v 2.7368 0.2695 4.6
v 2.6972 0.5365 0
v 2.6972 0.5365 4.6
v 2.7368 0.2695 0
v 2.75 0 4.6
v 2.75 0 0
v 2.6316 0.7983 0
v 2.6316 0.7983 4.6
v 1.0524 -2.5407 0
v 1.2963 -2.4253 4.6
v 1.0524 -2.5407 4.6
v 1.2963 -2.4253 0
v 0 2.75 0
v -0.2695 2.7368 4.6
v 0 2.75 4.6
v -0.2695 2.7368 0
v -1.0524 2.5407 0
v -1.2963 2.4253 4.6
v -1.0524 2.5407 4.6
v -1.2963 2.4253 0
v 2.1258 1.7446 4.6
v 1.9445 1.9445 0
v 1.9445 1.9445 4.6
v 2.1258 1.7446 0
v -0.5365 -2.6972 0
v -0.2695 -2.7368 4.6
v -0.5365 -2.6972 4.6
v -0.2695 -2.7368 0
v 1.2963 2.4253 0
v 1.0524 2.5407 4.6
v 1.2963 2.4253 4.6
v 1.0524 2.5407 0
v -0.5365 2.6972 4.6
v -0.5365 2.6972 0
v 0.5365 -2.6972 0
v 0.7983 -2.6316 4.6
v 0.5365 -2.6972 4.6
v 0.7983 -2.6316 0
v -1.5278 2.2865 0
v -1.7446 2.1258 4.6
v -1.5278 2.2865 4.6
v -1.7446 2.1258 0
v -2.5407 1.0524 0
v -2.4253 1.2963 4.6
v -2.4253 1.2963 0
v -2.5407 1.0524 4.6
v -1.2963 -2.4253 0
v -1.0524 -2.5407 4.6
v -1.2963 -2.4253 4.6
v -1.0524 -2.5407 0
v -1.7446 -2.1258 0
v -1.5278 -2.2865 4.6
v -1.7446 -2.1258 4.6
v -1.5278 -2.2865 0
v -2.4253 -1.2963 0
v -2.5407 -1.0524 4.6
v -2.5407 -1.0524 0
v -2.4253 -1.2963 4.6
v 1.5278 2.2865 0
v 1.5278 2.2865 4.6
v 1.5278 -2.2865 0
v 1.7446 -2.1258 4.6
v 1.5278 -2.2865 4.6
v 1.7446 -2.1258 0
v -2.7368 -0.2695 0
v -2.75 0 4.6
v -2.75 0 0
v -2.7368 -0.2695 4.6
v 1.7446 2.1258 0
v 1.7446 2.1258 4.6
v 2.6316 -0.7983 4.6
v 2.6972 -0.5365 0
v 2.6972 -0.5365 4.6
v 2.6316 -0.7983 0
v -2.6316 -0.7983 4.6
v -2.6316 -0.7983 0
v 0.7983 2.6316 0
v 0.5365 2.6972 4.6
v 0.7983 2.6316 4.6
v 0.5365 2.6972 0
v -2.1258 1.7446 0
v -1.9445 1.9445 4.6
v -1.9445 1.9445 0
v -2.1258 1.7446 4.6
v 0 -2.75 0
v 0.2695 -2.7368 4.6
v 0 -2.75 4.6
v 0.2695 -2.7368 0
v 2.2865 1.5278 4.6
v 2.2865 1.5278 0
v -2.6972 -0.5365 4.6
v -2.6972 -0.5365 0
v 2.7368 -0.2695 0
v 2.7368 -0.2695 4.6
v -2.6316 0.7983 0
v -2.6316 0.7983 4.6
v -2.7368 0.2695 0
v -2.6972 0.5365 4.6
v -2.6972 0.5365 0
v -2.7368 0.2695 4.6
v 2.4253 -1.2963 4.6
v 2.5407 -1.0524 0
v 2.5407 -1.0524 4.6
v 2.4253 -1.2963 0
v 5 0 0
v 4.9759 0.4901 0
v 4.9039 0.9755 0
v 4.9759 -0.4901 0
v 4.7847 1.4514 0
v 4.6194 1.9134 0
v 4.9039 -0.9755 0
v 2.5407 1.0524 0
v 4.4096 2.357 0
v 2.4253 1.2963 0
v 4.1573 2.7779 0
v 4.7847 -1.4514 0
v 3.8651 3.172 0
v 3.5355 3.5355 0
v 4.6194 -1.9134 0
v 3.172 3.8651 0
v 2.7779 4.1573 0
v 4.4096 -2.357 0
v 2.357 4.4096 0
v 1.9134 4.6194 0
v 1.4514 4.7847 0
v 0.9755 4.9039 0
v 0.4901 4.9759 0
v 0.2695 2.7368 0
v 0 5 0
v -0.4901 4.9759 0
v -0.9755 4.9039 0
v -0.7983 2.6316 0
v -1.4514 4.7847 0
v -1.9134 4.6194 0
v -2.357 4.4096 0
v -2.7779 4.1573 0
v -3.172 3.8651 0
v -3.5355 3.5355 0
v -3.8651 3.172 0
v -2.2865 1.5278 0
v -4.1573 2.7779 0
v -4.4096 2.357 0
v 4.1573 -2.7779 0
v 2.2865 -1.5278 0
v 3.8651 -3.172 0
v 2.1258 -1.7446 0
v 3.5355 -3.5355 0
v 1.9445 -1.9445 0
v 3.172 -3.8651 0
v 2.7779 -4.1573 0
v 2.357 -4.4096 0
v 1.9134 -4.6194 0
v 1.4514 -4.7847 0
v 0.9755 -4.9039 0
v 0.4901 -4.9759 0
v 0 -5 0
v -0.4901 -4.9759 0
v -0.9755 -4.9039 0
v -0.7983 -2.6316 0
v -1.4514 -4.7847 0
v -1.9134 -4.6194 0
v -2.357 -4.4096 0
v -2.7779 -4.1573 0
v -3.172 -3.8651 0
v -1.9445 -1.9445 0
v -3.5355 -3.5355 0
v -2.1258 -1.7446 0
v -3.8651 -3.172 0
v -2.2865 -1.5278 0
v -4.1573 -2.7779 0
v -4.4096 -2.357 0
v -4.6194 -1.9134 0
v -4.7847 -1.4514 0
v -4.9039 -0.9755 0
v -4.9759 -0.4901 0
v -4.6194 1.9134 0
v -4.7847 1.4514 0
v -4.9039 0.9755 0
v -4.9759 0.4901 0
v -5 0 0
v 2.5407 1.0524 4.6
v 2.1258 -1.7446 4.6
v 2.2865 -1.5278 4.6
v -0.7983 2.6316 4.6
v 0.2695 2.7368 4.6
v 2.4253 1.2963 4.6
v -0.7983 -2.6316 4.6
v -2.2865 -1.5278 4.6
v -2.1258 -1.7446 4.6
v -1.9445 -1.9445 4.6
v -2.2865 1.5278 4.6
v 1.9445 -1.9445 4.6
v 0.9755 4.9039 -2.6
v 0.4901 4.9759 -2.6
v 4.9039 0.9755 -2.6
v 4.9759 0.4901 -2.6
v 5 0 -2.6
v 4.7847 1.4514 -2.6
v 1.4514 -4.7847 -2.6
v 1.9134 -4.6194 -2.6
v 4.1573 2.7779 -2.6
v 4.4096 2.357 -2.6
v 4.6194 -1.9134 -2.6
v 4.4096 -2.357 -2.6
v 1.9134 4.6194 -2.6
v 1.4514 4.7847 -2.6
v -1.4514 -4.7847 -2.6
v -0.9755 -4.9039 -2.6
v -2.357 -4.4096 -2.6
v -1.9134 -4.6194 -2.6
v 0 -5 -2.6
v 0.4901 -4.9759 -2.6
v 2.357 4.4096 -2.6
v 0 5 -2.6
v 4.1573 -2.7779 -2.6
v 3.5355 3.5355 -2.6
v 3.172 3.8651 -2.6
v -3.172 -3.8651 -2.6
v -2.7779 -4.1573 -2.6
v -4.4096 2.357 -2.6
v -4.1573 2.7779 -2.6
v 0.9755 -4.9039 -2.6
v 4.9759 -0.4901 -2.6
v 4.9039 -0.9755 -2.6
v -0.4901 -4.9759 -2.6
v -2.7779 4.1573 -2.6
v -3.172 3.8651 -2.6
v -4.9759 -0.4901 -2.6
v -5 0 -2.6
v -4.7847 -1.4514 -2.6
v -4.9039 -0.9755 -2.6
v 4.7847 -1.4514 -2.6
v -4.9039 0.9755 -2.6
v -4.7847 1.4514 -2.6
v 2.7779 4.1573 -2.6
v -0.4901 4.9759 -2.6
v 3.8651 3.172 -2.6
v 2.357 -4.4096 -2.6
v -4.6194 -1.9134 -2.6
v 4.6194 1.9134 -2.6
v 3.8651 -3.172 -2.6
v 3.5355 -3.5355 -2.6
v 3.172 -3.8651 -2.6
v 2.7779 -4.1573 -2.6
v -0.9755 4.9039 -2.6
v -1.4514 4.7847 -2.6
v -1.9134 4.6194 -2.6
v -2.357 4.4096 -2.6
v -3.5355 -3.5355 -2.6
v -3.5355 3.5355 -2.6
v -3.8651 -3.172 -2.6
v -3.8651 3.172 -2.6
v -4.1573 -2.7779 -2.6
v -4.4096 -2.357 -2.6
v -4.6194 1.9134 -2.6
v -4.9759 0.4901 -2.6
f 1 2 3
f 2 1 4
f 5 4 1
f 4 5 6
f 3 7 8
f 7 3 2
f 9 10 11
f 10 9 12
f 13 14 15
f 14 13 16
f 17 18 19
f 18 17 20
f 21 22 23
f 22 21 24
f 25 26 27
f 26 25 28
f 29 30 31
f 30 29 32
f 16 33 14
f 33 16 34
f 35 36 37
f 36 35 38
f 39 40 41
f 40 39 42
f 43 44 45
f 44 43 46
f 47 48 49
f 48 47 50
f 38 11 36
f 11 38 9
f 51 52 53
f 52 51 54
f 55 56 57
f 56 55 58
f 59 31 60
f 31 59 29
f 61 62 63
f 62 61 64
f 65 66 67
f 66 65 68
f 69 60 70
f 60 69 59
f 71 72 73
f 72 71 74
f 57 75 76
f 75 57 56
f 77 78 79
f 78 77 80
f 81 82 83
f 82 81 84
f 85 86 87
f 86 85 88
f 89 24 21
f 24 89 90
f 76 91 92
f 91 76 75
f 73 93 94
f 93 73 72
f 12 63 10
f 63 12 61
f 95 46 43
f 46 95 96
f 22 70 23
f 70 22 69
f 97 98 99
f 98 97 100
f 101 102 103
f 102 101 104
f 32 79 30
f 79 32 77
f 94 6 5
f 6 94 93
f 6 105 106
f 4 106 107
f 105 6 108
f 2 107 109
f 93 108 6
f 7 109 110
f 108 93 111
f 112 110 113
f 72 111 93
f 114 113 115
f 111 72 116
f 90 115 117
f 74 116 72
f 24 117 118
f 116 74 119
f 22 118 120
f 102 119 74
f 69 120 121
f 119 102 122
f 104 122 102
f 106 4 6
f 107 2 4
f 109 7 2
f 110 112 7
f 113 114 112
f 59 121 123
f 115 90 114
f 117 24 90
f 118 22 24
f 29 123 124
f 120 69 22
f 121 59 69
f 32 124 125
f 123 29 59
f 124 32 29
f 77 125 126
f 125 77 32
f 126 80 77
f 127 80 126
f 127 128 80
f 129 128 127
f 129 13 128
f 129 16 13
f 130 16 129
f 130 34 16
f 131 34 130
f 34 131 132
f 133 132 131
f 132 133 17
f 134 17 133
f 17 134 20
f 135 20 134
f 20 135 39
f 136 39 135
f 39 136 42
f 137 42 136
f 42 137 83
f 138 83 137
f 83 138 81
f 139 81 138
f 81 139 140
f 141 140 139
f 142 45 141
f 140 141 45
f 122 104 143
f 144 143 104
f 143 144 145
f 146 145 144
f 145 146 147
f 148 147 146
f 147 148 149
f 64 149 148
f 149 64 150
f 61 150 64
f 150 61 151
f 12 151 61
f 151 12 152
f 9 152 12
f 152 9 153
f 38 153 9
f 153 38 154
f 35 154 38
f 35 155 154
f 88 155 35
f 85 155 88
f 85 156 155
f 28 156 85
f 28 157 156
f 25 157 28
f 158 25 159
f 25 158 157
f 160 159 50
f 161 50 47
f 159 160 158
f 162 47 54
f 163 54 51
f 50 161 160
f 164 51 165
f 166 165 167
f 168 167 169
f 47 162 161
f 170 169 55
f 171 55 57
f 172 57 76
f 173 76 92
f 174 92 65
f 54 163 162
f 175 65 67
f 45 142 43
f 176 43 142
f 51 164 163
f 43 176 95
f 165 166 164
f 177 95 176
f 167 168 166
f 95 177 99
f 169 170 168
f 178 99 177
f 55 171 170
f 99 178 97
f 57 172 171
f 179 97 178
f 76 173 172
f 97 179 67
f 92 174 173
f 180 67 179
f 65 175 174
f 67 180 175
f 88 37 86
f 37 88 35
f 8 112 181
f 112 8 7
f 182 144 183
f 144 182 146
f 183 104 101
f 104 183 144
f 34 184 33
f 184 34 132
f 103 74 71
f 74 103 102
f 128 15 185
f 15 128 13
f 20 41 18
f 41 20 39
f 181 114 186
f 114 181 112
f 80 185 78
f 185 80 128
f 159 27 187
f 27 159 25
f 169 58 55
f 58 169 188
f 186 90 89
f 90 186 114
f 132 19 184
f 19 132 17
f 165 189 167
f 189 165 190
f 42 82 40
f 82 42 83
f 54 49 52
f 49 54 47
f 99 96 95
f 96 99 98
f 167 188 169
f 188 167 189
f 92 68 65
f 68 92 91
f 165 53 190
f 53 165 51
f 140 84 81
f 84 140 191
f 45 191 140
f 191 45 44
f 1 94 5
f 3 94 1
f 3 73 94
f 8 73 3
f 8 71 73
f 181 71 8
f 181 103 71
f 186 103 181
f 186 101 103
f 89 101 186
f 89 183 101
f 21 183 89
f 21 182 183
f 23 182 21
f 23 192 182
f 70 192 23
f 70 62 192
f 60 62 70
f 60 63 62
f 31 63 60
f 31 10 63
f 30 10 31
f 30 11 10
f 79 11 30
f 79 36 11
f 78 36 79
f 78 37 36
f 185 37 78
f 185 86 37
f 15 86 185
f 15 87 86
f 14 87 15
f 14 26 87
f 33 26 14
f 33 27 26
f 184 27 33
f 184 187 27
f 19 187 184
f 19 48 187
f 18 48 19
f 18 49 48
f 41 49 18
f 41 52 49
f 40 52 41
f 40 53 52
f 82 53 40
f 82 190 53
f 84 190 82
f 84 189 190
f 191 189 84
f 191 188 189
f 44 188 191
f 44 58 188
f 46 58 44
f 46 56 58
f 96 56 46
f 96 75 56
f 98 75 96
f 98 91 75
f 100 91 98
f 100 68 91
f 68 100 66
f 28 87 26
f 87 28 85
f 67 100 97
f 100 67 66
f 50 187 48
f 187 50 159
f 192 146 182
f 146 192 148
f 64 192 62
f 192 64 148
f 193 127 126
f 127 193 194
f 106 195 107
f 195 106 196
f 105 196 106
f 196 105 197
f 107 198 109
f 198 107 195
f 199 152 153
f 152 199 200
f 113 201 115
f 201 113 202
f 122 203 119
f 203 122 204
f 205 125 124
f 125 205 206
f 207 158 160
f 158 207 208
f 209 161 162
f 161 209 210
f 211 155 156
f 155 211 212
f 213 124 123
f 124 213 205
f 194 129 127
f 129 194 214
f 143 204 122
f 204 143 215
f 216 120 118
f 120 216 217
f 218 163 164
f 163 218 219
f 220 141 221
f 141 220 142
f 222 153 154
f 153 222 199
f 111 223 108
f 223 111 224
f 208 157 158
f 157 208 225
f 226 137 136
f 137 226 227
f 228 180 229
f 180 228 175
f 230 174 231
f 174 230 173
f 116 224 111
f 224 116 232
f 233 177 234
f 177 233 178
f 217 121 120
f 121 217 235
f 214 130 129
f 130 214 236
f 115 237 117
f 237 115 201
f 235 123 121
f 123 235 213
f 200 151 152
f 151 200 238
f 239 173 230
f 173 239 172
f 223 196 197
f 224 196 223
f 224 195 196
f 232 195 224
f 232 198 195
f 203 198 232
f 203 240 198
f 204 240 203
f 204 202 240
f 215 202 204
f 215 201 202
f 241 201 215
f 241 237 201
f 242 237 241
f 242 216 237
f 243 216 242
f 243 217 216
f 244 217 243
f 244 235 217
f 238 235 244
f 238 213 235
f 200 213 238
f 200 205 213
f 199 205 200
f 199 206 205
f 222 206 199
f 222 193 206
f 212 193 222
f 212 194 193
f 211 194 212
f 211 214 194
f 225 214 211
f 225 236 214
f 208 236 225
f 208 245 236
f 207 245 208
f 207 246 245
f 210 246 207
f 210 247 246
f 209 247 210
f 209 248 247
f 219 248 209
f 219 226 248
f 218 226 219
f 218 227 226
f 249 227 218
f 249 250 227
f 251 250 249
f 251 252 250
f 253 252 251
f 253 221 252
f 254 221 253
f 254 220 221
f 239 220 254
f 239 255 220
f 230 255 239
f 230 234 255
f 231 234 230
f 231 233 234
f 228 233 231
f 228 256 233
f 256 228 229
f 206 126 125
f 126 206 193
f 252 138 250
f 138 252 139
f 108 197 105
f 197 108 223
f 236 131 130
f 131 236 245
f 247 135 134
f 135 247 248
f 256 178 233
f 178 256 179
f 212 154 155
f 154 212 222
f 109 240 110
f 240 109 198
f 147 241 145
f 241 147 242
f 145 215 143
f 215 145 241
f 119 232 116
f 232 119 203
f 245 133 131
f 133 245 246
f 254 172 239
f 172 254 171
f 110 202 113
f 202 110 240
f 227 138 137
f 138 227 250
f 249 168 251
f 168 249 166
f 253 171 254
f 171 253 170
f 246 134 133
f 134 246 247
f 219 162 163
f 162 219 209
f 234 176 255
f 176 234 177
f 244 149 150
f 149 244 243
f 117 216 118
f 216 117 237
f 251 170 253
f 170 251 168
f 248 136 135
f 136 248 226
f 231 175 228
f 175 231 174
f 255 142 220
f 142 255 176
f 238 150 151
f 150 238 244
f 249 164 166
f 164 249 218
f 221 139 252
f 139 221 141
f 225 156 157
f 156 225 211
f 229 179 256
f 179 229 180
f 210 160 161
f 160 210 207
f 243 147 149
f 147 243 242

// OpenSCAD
$fn     = 64;

baseD   = 10;
baseH   = 2.6;

stemD    = 5.5;
stemH    = 4.6;



//Start
cylinder(d=stemD, h=stemH); //Button
translate([0,0,-baseH]) cylinder(d=baseD, h=baseH); //Base
